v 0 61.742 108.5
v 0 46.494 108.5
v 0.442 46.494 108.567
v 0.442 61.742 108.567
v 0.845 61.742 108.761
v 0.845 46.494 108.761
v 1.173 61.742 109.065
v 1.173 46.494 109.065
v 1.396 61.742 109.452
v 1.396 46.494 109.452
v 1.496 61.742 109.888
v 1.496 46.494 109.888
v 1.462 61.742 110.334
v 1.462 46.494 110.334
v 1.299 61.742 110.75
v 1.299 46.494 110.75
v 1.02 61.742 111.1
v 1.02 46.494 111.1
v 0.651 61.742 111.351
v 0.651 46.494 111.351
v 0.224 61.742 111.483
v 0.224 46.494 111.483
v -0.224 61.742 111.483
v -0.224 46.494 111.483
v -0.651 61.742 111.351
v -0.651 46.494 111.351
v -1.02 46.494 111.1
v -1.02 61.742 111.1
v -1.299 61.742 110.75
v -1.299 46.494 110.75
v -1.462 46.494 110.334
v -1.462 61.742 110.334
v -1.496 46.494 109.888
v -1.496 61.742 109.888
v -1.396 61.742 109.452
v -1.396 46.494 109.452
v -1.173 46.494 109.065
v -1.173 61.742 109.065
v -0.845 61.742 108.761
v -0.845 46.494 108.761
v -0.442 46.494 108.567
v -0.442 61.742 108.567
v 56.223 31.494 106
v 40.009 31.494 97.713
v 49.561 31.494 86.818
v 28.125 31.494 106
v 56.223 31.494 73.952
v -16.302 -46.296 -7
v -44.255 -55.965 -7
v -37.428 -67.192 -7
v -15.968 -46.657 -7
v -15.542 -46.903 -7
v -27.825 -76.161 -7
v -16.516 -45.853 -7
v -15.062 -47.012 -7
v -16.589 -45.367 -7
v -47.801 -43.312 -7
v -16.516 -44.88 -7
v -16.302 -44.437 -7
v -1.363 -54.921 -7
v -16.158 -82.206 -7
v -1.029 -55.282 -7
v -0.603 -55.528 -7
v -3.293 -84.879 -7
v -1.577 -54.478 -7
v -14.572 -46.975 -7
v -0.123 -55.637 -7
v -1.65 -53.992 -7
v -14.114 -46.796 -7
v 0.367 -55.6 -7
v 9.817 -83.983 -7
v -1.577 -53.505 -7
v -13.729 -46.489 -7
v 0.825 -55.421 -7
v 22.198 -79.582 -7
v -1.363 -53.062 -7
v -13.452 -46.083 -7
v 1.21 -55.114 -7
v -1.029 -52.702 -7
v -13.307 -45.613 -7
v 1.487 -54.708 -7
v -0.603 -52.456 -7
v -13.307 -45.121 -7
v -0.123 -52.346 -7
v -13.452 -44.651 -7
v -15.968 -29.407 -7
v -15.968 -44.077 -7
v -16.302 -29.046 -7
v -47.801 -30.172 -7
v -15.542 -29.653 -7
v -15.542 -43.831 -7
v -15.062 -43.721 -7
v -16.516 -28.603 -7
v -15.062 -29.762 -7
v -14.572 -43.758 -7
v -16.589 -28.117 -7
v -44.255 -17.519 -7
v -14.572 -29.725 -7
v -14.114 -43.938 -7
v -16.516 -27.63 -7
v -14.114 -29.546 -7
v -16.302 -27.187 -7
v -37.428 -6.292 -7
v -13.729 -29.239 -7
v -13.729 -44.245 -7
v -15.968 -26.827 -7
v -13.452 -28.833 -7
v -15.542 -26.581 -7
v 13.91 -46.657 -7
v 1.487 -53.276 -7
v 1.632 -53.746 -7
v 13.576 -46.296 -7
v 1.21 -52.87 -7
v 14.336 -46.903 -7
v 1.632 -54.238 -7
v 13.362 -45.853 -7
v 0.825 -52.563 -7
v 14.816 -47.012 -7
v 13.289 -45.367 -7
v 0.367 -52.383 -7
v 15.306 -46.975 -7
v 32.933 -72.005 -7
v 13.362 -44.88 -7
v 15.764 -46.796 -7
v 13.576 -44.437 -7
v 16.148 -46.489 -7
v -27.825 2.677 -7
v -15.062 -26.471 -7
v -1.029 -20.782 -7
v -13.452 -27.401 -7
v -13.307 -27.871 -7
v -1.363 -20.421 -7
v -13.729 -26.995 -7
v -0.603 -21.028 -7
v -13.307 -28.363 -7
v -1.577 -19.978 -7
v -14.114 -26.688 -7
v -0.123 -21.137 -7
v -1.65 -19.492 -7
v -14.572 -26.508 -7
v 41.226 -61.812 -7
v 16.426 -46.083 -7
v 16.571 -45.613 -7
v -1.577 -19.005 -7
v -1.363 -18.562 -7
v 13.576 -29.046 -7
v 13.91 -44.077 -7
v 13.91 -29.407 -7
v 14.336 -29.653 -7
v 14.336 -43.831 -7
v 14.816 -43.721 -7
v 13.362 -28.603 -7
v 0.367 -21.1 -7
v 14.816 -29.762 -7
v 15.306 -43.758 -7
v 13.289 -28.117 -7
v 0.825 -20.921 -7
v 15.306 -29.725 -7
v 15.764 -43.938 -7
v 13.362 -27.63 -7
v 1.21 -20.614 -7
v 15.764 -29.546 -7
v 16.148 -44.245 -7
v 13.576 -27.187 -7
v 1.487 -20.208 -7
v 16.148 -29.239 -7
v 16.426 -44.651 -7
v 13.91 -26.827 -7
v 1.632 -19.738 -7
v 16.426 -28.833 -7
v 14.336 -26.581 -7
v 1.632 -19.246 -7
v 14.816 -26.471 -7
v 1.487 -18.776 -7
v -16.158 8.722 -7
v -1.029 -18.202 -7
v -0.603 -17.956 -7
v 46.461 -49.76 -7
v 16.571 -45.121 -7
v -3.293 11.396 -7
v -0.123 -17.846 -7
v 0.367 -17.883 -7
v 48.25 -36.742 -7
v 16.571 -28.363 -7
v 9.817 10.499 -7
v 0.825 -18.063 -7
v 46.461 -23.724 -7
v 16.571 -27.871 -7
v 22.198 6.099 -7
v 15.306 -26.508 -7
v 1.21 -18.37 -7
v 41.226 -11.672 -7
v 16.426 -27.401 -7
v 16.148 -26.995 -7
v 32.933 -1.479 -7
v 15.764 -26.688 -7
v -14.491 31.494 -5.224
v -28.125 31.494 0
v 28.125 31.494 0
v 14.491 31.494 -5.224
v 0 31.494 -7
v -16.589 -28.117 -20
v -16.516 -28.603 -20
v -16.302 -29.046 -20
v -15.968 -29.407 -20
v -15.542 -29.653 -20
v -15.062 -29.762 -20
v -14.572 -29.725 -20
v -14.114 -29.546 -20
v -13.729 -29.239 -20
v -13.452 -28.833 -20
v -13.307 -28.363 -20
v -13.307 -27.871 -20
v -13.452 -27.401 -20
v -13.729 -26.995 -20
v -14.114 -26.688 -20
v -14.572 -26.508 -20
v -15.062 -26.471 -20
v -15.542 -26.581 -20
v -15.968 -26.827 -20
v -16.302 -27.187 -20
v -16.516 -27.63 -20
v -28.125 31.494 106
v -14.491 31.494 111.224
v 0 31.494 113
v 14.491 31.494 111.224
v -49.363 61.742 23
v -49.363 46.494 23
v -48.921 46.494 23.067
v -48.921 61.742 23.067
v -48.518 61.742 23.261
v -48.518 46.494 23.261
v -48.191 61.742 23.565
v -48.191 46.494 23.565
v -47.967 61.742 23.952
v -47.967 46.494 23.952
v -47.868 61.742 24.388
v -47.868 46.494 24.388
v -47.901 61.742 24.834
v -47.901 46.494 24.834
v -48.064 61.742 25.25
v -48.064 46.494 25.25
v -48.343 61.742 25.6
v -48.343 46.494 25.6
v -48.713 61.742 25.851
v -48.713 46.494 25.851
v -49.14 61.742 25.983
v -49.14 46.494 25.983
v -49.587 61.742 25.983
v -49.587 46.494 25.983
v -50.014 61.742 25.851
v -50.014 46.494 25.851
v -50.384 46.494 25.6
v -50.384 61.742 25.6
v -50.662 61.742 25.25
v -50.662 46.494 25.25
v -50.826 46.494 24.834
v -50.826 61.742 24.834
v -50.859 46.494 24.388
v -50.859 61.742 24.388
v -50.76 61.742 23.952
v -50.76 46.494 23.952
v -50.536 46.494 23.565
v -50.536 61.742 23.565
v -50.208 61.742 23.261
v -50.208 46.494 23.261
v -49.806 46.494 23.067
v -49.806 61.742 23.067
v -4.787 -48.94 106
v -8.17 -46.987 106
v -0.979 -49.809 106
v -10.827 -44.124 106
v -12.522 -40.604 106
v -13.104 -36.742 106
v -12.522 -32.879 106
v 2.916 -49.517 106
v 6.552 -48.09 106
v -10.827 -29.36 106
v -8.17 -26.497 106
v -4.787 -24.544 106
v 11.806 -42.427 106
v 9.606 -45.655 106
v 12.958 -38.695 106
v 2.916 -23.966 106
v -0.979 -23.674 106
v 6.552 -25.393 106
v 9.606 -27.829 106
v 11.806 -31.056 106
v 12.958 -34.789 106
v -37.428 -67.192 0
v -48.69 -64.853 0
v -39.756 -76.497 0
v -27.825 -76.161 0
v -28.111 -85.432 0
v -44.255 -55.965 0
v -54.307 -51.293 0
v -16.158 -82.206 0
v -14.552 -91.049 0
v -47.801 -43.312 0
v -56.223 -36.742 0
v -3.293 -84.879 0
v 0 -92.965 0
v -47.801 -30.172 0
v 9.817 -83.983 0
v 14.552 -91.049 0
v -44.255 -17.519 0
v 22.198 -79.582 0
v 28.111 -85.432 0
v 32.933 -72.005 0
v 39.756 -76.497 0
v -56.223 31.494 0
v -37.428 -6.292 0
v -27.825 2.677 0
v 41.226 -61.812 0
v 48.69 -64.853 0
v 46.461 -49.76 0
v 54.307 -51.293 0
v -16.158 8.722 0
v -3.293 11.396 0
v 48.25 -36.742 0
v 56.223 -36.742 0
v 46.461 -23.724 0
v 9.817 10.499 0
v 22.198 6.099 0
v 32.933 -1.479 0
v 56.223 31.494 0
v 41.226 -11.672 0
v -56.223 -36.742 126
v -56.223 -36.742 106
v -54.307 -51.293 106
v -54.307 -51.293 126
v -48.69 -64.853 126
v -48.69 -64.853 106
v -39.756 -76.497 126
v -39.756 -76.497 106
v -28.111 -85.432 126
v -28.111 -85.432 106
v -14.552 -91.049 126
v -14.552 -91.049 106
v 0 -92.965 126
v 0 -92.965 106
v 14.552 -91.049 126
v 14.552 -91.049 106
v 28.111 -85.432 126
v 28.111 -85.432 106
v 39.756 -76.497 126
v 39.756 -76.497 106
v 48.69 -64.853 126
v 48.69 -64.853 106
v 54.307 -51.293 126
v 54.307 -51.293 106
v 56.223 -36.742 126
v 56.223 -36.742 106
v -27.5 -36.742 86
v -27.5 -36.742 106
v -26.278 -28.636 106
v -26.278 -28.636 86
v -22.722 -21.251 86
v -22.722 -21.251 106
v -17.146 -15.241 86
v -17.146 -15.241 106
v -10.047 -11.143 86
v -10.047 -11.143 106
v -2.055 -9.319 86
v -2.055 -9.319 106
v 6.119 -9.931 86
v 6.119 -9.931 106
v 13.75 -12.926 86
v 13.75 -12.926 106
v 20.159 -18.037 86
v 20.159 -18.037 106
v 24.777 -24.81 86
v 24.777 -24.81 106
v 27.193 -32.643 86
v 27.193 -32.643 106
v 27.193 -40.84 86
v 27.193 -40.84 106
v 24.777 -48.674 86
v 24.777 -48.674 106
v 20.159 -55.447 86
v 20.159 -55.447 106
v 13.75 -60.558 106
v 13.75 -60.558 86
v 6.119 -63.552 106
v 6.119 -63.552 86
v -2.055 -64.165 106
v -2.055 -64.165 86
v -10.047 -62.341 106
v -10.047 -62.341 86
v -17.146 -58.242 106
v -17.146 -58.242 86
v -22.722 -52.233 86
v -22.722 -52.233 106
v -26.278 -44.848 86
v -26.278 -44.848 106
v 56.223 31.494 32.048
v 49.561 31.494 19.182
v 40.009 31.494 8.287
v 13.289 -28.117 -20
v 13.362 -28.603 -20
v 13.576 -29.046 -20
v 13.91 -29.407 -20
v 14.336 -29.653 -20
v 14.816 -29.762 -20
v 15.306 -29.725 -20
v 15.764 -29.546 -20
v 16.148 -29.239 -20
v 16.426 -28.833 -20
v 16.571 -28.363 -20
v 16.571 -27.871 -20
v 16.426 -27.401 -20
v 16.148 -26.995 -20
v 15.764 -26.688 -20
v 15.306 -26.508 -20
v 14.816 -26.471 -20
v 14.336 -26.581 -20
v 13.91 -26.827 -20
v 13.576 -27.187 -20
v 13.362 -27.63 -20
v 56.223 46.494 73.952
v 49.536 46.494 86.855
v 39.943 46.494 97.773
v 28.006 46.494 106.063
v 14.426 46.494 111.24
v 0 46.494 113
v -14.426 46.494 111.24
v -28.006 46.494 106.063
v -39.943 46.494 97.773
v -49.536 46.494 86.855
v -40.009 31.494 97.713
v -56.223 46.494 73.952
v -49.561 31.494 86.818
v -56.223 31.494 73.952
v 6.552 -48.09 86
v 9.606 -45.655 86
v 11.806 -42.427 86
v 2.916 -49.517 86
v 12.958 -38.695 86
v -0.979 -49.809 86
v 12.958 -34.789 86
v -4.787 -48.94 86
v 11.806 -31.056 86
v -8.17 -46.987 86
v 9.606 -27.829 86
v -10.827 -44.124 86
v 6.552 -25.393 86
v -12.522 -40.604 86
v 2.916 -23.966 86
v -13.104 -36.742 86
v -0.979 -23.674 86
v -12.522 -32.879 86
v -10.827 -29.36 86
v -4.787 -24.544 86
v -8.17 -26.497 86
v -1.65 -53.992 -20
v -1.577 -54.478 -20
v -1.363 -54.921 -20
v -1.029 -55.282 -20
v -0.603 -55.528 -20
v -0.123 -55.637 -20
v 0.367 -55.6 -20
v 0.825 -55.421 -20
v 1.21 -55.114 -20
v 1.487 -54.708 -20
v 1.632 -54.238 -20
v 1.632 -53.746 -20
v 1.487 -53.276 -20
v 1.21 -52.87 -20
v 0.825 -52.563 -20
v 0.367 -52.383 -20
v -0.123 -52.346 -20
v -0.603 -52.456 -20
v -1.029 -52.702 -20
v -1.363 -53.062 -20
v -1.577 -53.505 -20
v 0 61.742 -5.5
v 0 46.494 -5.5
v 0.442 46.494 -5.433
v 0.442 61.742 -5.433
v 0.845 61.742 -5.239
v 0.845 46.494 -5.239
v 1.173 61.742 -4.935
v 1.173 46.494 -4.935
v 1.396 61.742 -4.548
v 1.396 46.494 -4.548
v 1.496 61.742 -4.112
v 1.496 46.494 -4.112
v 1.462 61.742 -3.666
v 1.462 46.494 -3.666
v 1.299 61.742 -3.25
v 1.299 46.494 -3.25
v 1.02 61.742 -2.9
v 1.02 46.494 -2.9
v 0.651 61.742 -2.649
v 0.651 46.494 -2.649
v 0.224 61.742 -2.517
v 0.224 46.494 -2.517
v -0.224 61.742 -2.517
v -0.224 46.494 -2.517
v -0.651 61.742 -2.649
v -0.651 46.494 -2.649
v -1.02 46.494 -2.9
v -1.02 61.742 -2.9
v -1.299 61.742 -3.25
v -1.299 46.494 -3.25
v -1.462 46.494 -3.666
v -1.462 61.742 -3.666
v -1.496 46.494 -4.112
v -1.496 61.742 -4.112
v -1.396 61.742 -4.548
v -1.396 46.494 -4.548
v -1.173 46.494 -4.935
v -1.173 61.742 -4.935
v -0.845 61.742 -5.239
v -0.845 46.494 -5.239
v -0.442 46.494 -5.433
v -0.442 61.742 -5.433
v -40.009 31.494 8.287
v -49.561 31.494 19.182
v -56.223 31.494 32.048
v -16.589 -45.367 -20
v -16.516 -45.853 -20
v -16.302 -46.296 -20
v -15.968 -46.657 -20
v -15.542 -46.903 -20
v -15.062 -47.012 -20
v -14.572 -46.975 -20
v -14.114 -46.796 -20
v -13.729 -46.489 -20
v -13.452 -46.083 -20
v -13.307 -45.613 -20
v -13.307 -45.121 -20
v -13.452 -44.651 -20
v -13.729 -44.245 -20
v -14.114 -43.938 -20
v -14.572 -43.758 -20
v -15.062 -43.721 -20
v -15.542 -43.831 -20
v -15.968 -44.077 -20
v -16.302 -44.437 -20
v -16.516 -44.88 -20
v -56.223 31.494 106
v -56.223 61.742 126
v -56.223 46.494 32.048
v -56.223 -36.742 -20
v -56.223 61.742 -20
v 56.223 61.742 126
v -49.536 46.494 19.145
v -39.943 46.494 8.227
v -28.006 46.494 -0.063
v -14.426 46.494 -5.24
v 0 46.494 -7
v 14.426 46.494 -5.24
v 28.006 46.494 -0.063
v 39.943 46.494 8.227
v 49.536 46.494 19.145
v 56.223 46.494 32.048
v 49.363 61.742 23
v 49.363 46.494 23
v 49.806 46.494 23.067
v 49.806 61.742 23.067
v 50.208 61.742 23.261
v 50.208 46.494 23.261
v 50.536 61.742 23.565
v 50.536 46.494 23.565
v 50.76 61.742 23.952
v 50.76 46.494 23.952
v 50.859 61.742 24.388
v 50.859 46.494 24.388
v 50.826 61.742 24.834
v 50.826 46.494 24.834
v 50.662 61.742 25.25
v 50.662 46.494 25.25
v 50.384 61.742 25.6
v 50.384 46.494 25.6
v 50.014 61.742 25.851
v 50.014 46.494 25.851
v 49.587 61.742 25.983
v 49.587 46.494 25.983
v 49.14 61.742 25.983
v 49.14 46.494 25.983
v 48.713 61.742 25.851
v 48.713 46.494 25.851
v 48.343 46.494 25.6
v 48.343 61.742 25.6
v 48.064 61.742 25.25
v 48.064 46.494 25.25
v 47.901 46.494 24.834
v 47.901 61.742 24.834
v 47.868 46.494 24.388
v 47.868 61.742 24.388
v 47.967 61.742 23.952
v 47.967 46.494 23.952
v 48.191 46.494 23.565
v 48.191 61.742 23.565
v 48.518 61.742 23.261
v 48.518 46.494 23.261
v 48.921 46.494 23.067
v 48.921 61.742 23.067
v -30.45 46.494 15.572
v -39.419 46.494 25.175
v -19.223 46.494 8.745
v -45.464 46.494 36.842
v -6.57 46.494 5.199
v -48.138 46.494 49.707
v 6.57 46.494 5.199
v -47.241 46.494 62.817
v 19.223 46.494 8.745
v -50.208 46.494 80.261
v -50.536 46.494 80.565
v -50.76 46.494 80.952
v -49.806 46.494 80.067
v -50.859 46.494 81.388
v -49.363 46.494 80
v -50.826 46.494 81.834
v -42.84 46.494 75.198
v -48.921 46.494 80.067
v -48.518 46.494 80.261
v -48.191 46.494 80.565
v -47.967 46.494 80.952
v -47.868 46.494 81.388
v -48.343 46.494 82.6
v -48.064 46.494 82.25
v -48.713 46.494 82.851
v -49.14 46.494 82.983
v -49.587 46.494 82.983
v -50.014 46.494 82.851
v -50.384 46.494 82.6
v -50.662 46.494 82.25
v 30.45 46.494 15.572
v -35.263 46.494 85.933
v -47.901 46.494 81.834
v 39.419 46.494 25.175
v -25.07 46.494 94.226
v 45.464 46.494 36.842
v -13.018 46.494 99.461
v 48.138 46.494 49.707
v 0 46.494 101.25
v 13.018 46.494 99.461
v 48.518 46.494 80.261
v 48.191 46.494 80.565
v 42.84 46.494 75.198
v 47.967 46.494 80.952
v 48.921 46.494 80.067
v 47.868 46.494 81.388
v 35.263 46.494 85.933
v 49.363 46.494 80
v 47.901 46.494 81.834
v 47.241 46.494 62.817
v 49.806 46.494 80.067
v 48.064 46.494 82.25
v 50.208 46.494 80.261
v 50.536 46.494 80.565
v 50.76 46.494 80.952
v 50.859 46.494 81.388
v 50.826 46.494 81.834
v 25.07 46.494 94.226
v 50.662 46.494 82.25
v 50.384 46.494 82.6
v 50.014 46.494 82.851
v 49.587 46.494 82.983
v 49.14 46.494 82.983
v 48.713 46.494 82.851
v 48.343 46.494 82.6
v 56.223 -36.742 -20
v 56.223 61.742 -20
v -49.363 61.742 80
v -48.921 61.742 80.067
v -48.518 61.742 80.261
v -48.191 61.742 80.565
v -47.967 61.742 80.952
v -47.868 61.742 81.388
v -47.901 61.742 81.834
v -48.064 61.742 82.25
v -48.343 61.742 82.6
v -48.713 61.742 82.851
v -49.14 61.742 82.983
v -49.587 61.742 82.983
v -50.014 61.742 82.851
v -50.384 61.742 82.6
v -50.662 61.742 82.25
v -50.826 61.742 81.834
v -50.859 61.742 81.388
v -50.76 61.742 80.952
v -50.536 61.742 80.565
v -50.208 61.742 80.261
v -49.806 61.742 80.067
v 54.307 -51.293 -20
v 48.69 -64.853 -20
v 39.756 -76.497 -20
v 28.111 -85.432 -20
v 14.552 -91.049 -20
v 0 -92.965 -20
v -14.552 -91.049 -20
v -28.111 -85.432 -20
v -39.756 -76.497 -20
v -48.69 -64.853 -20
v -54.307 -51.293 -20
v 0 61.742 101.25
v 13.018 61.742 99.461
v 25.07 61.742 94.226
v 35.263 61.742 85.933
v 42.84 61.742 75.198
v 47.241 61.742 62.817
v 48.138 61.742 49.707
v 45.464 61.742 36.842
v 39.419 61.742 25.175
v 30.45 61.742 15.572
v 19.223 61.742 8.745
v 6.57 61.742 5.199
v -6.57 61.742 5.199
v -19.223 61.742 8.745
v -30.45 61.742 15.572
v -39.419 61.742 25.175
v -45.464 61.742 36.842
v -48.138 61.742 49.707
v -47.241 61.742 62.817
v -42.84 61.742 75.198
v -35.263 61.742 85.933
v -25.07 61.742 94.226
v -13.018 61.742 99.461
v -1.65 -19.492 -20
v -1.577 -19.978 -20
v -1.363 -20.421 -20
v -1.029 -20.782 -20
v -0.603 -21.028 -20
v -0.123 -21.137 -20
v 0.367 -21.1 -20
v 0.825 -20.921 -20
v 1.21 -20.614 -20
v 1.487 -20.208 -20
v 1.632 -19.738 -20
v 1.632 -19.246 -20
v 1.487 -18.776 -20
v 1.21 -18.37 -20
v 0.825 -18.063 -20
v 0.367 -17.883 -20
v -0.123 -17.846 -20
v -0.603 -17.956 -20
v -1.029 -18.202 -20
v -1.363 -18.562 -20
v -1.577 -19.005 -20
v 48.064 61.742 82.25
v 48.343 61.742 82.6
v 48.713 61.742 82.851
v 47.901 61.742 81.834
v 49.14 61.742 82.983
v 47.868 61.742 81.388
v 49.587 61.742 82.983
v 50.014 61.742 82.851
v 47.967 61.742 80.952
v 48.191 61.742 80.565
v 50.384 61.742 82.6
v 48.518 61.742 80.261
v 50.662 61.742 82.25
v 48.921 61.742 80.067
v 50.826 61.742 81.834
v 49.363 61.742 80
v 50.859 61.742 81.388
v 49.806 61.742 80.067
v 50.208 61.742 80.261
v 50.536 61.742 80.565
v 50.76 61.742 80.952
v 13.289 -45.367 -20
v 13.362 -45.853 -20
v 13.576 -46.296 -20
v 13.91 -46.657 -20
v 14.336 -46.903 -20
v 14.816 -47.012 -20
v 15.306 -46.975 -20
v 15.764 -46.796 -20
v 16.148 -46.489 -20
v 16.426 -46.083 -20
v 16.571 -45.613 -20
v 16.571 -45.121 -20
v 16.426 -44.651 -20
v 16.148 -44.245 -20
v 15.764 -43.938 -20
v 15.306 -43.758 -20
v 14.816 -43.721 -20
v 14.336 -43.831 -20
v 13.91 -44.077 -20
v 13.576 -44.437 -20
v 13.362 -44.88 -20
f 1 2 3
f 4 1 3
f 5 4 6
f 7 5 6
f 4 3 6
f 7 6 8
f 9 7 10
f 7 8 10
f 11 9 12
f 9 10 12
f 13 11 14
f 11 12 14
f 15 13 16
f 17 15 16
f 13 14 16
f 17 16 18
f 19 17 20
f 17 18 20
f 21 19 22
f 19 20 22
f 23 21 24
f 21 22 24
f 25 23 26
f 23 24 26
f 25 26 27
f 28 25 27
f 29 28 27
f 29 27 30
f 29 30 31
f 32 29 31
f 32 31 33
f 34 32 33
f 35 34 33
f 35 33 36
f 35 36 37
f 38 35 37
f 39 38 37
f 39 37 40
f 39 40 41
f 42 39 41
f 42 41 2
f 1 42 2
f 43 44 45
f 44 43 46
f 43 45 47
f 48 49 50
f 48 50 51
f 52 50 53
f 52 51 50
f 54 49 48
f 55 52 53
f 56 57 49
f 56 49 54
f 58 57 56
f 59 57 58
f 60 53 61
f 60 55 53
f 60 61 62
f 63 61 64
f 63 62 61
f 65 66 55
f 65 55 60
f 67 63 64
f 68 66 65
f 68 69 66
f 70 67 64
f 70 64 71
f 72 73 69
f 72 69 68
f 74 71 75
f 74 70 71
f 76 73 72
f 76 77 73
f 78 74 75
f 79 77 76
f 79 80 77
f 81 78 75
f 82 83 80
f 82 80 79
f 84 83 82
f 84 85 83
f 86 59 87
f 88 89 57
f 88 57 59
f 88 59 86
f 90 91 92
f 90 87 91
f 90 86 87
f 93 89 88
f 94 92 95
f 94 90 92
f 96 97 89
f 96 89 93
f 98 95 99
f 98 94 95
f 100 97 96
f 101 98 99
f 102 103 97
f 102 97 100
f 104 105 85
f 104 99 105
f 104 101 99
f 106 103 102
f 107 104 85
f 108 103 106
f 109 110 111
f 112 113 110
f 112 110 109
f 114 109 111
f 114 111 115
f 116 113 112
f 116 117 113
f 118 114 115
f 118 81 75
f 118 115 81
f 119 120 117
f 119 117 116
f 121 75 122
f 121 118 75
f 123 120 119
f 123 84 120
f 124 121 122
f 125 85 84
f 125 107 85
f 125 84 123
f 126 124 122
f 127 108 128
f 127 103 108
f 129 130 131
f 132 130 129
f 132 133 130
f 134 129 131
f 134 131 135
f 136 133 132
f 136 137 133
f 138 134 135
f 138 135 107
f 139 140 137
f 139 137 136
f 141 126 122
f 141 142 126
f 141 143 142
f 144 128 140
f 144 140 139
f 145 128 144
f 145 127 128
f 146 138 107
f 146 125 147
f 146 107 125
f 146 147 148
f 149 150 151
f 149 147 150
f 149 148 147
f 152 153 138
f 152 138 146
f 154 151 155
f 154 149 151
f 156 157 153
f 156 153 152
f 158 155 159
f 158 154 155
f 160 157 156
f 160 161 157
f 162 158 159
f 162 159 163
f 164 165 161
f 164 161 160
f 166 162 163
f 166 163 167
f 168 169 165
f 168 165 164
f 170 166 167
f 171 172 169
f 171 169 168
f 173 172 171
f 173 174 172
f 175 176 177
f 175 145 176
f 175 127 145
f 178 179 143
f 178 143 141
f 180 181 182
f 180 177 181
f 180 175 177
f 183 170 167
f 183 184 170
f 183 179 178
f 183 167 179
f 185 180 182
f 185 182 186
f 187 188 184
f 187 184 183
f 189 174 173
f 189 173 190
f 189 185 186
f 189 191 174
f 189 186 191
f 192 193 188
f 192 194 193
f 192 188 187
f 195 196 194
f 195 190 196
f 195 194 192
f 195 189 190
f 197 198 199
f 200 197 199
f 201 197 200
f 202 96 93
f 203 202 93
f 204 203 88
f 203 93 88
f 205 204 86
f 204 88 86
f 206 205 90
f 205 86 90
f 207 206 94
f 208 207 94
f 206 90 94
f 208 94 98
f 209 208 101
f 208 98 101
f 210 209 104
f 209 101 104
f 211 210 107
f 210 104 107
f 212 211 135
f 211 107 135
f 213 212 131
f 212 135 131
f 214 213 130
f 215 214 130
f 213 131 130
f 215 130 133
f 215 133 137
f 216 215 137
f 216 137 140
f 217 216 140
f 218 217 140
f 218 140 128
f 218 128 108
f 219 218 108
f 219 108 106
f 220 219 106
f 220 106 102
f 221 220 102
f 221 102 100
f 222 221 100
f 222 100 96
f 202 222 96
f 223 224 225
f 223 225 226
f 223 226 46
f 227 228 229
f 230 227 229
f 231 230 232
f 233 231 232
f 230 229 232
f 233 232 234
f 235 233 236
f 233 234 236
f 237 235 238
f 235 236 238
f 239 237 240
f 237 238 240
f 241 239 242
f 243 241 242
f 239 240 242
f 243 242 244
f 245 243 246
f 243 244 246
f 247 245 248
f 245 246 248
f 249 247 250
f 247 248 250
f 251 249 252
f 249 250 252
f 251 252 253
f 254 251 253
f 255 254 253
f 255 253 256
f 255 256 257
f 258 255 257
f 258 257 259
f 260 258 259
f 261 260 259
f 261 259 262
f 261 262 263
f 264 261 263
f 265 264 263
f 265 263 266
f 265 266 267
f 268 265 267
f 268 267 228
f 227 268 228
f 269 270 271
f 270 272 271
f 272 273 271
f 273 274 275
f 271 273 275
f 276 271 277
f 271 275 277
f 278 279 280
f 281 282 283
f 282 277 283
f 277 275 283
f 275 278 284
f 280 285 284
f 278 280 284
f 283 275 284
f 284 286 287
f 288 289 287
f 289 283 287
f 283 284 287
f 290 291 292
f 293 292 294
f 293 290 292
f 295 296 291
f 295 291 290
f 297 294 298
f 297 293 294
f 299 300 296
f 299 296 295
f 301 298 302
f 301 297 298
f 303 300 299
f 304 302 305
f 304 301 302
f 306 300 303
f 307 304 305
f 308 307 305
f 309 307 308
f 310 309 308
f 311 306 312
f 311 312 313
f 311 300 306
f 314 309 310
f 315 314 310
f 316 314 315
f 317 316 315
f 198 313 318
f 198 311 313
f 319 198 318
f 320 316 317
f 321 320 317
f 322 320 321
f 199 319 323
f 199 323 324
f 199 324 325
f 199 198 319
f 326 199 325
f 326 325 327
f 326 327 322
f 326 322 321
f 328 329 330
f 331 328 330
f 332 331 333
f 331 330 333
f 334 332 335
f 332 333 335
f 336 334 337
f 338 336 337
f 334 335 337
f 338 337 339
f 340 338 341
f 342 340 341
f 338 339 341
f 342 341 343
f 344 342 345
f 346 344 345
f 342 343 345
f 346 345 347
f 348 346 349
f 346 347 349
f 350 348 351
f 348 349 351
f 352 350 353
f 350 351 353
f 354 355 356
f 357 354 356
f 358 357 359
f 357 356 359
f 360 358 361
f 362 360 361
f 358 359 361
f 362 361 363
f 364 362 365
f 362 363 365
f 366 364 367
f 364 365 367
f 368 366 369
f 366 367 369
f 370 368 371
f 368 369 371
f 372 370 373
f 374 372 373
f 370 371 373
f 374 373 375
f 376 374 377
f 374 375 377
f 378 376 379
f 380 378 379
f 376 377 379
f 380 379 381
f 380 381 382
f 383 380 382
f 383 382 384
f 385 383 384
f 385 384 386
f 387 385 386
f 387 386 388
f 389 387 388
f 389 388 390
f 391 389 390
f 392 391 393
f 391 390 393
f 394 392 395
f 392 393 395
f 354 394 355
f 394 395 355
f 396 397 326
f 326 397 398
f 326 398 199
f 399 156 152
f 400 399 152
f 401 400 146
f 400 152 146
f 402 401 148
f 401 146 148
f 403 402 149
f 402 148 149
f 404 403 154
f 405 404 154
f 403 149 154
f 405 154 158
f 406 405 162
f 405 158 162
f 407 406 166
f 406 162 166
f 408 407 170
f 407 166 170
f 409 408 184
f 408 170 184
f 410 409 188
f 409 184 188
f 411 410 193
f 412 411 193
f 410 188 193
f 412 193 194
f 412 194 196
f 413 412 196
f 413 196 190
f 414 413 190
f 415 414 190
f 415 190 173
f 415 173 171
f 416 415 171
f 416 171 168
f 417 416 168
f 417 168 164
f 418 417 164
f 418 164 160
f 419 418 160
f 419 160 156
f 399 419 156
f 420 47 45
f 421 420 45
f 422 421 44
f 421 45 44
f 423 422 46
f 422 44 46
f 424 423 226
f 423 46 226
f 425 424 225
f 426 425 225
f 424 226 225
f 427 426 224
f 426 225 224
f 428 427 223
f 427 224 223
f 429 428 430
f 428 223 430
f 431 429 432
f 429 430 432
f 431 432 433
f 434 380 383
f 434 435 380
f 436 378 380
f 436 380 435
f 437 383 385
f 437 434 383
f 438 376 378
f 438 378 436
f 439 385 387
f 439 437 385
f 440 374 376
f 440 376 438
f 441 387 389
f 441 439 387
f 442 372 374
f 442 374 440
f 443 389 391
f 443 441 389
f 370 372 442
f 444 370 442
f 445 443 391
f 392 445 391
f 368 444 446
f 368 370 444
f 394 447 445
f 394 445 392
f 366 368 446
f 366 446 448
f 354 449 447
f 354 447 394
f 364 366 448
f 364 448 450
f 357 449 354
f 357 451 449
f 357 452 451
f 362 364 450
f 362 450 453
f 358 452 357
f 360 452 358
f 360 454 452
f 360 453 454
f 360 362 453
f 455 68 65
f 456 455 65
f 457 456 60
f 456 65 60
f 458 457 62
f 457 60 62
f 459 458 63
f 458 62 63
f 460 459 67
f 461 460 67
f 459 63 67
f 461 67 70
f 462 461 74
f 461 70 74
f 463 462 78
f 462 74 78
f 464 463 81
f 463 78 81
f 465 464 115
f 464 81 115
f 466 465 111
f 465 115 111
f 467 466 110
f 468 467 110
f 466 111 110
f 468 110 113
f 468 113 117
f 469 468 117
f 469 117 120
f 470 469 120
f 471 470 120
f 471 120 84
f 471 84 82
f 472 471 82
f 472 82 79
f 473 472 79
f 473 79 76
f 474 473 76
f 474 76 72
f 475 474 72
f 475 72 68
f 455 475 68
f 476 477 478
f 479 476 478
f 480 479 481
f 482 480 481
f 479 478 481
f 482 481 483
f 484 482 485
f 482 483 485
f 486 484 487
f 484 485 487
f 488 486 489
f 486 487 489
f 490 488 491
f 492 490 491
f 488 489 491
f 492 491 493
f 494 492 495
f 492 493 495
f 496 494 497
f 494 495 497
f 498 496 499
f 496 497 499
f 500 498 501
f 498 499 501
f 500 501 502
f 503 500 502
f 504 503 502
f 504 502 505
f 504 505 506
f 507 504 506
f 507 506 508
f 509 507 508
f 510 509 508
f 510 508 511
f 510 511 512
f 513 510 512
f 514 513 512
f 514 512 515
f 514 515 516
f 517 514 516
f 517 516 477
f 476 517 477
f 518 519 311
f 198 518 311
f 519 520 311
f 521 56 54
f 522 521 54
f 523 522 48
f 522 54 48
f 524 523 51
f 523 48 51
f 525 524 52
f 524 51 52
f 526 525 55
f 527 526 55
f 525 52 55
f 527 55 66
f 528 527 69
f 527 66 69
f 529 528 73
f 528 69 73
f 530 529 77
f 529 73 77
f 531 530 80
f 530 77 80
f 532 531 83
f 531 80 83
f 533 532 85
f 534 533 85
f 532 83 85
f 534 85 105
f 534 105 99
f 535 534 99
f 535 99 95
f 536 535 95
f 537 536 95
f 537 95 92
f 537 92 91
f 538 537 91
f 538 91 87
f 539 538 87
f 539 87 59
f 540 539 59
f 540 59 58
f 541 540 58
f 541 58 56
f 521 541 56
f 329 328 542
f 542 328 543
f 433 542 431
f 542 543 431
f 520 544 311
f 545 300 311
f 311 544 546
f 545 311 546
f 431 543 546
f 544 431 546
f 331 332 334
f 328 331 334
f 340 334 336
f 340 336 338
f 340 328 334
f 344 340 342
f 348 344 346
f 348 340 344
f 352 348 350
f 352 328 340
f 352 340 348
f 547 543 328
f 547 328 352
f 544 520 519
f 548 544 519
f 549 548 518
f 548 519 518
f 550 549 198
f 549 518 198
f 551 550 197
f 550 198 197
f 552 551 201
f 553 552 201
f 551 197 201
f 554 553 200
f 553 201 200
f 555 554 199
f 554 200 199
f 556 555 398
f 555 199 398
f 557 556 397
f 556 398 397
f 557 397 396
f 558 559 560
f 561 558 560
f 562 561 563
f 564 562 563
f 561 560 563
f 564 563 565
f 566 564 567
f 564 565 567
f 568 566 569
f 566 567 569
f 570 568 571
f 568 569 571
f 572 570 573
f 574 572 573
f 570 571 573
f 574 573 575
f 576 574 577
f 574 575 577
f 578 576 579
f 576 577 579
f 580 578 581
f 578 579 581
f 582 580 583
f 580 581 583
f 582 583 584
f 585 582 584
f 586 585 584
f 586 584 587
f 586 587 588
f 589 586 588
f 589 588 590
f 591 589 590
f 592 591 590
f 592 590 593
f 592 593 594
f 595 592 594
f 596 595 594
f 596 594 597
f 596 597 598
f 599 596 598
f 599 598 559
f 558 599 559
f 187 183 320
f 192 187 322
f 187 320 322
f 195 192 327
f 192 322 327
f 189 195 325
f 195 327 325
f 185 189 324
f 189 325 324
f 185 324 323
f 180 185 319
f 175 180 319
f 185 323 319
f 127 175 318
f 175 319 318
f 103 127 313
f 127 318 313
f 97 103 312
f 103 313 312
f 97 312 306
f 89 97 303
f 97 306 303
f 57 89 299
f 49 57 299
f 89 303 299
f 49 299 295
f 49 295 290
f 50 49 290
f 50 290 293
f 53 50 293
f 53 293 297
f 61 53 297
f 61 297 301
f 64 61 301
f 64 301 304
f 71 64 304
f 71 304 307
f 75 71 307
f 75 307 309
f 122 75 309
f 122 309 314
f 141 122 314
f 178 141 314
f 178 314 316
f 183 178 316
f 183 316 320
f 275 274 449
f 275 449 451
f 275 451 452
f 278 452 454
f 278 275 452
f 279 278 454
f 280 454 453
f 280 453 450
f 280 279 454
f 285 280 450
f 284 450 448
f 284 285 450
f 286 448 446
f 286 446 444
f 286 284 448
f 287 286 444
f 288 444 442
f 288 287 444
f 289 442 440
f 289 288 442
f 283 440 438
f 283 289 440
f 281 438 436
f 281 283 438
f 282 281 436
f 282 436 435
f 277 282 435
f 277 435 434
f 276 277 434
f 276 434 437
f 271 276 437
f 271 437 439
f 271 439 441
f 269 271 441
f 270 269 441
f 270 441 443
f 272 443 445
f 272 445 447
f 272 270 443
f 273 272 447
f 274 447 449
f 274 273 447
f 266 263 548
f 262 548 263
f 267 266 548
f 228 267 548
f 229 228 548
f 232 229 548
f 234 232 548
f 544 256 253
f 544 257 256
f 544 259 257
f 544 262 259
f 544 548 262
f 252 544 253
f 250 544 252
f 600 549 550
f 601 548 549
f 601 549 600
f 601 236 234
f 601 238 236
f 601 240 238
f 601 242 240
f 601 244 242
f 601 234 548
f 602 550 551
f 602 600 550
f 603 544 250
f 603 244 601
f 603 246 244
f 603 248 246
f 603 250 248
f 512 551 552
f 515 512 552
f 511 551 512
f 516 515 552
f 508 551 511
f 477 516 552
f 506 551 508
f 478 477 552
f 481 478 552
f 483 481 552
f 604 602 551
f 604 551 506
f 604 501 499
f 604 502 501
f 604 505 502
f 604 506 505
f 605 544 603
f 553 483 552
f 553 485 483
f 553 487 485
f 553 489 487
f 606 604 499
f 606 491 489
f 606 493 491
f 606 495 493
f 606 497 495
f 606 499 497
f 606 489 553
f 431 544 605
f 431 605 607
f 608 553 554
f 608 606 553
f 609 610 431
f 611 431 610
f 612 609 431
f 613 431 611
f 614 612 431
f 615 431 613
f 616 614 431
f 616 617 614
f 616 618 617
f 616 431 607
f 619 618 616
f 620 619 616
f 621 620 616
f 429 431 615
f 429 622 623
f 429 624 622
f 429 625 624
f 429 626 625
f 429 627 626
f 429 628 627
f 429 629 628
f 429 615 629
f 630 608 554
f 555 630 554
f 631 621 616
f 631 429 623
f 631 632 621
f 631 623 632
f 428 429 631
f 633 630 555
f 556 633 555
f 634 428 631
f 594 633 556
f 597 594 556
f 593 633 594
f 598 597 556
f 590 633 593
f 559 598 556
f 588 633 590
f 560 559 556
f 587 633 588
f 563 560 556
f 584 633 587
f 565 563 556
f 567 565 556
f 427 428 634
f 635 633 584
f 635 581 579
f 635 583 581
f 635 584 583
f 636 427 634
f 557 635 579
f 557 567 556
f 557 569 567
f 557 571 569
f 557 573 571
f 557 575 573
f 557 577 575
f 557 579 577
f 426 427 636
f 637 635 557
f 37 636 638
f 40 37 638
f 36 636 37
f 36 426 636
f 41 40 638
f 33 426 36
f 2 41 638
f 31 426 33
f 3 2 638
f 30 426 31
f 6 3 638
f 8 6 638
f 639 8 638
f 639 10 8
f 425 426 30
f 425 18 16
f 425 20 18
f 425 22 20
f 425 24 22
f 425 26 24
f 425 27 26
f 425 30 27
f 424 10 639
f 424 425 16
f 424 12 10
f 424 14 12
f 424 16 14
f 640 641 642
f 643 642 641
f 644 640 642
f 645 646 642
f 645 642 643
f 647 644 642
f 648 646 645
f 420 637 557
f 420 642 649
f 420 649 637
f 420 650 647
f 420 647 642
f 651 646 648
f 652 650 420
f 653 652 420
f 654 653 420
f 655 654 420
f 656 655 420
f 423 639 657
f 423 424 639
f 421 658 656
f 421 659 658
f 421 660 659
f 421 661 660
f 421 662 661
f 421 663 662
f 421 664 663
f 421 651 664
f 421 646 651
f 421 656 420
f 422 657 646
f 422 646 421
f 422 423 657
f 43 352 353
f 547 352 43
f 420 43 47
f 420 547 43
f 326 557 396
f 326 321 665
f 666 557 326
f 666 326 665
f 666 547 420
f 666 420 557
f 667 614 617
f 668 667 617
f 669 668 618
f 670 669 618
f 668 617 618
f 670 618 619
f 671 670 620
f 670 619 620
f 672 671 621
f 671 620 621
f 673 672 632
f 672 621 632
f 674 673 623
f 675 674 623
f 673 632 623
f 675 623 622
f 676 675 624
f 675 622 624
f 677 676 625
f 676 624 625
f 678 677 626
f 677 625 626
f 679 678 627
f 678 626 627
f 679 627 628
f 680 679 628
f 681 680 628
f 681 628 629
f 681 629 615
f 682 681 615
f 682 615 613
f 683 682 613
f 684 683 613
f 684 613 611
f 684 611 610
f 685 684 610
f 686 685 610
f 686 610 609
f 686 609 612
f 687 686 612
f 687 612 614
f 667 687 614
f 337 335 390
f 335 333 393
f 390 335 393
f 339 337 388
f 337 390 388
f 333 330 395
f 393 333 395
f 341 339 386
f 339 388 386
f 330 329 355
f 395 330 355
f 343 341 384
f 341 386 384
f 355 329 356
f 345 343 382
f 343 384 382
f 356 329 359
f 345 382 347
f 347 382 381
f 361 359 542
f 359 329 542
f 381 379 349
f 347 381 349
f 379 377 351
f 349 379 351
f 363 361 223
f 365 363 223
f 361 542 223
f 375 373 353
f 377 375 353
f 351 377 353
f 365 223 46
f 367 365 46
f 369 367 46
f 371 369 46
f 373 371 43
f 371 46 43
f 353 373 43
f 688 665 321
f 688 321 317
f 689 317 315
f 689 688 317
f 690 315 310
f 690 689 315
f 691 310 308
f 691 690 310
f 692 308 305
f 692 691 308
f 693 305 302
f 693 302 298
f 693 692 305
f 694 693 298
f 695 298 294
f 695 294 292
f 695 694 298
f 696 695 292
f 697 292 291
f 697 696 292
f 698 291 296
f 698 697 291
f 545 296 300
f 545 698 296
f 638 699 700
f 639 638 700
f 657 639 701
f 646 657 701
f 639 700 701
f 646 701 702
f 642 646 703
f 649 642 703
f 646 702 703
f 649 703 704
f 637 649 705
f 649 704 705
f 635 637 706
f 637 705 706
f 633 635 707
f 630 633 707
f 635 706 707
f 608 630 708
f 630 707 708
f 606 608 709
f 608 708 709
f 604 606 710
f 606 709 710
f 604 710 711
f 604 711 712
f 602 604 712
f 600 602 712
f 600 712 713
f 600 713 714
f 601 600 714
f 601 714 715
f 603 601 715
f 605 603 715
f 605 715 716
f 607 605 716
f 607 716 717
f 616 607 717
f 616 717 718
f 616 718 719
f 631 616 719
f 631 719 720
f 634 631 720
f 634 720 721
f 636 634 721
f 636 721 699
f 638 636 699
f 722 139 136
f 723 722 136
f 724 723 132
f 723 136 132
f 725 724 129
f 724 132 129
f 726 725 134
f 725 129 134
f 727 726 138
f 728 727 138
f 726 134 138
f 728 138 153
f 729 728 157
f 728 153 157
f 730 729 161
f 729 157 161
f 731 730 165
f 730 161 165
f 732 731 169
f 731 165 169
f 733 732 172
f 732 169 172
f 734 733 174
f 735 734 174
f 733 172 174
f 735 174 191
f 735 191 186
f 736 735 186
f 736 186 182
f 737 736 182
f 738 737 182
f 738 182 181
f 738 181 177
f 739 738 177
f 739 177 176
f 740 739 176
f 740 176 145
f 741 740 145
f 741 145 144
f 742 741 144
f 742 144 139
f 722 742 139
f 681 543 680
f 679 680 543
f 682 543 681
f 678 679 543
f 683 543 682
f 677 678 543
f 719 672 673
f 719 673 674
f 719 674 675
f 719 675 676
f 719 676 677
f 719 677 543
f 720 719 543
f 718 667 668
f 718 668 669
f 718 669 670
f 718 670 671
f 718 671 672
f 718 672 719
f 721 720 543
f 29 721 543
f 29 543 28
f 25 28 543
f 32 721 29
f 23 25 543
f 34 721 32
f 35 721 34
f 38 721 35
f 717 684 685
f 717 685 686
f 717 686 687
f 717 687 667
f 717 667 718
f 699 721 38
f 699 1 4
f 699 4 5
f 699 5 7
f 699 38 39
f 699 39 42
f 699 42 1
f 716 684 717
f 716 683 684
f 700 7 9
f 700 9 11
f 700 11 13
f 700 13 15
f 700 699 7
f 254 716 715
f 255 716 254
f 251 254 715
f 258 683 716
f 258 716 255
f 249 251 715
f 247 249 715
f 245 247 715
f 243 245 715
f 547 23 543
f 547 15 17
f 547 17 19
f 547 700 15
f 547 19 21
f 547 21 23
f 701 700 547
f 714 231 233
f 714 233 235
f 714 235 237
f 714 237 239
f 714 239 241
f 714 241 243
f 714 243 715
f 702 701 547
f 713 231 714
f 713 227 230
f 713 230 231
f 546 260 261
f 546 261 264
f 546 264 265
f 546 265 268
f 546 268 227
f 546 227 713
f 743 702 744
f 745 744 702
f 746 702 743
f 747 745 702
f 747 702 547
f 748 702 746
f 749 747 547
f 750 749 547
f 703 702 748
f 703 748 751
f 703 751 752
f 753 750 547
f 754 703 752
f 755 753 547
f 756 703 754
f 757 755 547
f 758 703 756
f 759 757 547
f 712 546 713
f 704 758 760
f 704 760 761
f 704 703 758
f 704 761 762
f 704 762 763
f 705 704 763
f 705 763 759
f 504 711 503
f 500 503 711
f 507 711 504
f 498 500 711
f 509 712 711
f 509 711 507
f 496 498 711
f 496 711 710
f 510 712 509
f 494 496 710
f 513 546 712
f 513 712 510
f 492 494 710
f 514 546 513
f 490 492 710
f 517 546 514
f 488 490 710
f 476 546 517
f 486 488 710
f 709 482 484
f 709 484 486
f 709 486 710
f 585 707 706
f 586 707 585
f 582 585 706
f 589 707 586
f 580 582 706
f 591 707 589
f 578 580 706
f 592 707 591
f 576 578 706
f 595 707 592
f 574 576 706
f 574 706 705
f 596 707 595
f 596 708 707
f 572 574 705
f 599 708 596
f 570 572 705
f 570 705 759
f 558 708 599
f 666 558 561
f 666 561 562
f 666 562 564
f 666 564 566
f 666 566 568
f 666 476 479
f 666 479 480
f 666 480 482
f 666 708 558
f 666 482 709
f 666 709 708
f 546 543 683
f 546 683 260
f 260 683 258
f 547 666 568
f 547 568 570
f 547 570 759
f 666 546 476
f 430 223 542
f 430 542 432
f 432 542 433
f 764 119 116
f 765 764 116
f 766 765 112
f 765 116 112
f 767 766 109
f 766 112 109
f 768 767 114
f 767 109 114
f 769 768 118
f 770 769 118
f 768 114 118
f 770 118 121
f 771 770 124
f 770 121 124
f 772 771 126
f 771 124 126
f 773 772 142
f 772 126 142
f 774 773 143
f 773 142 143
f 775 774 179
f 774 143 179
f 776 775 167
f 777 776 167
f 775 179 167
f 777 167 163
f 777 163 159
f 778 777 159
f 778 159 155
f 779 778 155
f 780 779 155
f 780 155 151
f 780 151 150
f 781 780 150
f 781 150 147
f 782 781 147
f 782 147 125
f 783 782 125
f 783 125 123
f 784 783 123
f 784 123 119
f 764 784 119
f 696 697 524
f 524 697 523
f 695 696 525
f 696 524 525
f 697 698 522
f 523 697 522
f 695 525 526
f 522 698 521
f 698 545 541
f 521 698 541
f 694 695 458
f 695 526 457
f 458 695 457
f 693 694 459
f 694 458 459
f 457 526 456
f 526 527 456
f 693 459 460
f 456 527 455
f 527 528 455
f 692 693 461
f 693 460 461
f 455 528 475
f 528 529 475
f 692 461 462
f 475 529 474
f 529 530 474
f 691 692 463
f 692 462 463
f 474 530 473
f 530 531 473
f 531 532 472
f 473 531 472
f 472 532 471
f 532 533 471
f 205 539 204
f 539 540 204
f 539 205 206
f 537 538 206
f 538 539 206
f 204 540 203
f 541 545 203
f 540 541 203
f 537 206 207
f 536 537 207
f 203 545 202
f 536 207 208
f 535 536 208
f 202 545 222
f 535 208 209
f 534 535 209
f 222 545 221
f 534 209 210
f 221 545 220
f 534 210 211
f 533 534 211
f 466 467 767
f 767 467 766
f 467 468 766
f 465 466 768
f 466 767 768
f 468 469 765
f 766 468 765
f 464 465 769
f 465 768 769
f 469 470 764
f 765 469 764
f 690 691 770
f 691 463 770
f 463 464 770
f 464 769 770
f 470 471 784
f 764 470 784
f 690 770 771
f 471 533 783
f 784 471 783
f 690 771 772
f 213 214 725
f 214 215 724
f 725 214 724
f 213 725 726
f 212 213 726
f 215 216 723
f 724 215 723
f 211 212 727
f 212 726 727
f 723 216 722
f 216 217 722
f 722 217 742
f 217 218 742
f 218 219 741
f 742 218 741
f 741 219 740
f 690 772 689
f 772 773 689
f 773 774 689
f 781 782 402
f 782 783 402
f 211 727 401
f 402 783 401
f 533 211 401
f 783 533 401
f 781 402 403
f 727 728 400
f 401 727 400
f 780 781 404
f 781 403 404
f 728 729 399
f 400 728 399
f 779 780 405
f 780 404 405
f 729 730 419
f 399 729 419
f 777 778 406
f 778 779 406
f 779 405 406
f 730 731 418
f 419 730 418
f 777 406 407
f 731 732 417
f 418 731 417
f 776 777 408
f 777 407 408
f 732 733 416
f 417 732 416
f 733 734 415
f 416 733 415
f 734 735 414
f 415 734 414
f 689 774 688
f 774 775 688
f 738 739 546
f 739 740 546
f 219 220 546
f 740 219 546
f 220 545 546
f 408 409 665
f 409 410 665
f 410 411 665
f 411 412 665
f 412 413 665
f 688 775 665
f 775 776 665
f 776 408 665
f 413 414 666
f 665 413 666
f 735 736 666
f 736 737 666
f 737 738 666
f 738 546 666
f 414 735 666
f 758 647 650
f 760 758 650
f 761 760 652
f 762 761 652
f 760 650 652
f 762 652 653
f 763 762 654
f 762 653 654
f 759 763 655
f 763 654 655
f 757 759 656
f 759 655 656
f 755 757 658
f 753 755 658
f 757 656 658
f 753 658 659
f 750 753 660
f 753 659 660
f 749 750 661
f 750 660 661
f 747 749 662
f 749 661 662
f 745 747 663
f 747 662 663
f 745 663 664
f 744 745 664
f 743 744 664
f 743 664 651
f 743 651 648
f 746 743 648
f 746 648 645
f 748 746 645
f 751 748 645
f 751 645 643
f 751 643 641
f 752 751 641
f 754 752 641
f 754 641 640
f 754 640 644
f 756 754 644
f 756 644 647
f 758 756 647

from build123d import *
from build123d.topology import SkipClean

# Parameters (mm, degrees)
SKETCH_1_R                      = 48.25
EXTRUDE_1_DEPTH                 = 20
EXTRUDE_2_DEPTH                 = 66
SKETCH_3_R                      = 48.25
EXTRUDE_3_DEPTH                 = 20
SKETCH_4_R                      = 48.25
CUT_EXTRUDE_1_DEPTH             = 20
SKETCH_5_R                      = 48.25
EXTRUDE_4_DEPTH                 = 20
CUT_EXTRUDE_2_DEPTH             = 20
EXTRUDE_START                   = 20
SKETCH_7_R                      = 48.25
EXTRUDE_5_DEPTH                 = 20
CUT_EXTRUDE_START               = -20
CUT_EXTRUDE_3_DEPTH             = 20
SKETCH_9_R                      = 48.25
EXTRUDE_6_DEPTH                 = 20
EXTRUDE_START_2                 = -20
SKETCH_10_R                     = 48.25
EXTRUDE_7_DEPTH                 = 20
SKETCH_14_R                     = 1.65
EXTRUDE_11_DEPTH                = 10
EXTRUDE_START_3                 = 10
SKETCH_15_R                     = 1.65
EXTRUDE_12_DEPTH                = 10
SKETCH_16_R                     = 27.5
SKETCH_16_R_2                   = 13.104074627
EXTRUDE_13_DEPTH                = 20
CUT_EXTRUDE_4_REACH             = 168.371
SKETCH_17_R                     = 1.65
CUT_EXTRUDE_4_DIRECTION_2_REACH = 168.371
SKETCH_18_R                     = 48.25
CUT_EXTRUDE_5_DEPTH             = 7
CUT_EXTRUDE_6_DEPTH             = 193.775751689
EXTRUDE_START_4                 = 25
SKETCH_20_W                     = 112.445782612
SKETCH_20_H                     = 146
SKETCH_20_R                     = 48.25
EXTRUDE_14_DEPTH                = 25
SKETCH_21_R                     = 60
CUT_EXTRUDE_7_DEPTH             = 15
SKETCH_22_R                     = 1.5
CUT_EXTRUDE_8_DEPTH             = 197.177673484


with BuildPart() as part:
    # 草图1 → 凸台-拉伸1 (new body)
    with BuildSketch(Plane.XY):
        with BuildLine():
            Line((-56.222891306, -36.741813889), (-56.222891306, 36.741813889))
            Line((-56.222891306, 36.741813889), (56.222891306, 36.741813889))
            Line((56.222891306, 36.741813889), (56.222891306, -36.741813889))
            ThreePointArc((56.222891306, -36.741813889), (0, -92.964705195), (-56.222891306, -36.741813889))
        make_face()
        with Locations((0, -36.741813889)):
            Circle(SKETCH_1_R, mode=Mode.SUBTRACT)
    extrude(amount=EXTRUDE_1_DEPTH)

    # 草图2 → 凸台-拉伸2 (add)
    with BuildSketch(Plane.XY.offset(20)):
        Polygon((-43.974846567, 18.741813889), (-56.222891306, 18.741813889), (-56.222891306, 6.493769151), align=None)
        Polygon((56.222891306, 18.741813889), (43.974846567, 18.741813889), (56.222891306, 6.493769151), align=None)
        Polygon((-56.222891306, 36.741813889), (-56.222891306, 18.741813889), (-43.974846567, 18.741813889), (43.974846567, 18.741813889), (56.222891306, 18.741813889), (56.222891306, 36.741813889), align=None)
    extrude(amount=EXTRUDE_2_DEPTH)

    # 草图3 → 凸台-拉伸3 (add)
    with BuildSketch(Plane.XY.offset(86)):
        with BuildLine():
            Line((-56.222891306, 36.741813889), (-56.222891306, -36.741813889))
            ThreePointArc((-56.222891306, -36.741813889), (0, -92.964705195), (56.222891306, -36.741813889))
            Line((56.222891306, -36.741813889), (56.222891306, 36.741813889))
            Line((56.222891306, 36.741813889), (-56.222891306, 36.741813889))
        make_face()
        with Locations((0, -36.741813889)):
            Circle(SKETCH_3_R, mode=Mode.SUBTRACT)
    extrude(amount=EXTRUDE_3_DEPTH)

    # 草图4 → 切除-拉伸1 (cut)
    with BuildSketch(Plane(origin=(0, 36.741813889, 0), x_dir=(1, 0, 0), z_dir=(0, 1, 0))):
        with Locations(Location((0, -53, 0), (0, 0, 270))):
            Circle(SKETCH_4_R)
    extrude(amount=-CUT_EXTRUDE_1_DEPTH, mode=Mode.SUBTRACT)

    # 草图5 → 凸台-拉伸4 (add)
    with BuildSketch(Plane.XY.offset(106)):
        with BuildLine():
            Line((56.222891306, -36.741813889), (56.222891306, 36.741813889))
            Line((56.222891306, 36.741813889), (-56.222891306, 36.741813889))
            Line((-56.222891306, 36.741813889), (-56.222891306, -36.741813889))
            ThreePointArc((-56.222891306, -36.741813889), (0, -92.964705195), (56.222891306, -36.741813889))
        make_face()
        with Locations((0, -36.741813889)):
            Circle(SKETCH_5_R, mode=Mode.SUBTRACT)
    extrude(amount=EXTRUDE_4_DEPTH)

    # 草图6 → 切除-拉伸2 (cut)
    with BuildSketch(Plane(origin=(0, 0, 86), x_dir=(-1, 0, 0), z_dir=(0, 0, -1))):
        with BuildLine():
            Line((35.200319601, 16.741813889), (-35.200319601, 16.741813889))
            Line((-35.200319601, 16.741813889), (-35.200319601, 18.741813889))
            Line((-35.200319601, 18.741813889), (-43.974846567, 18.741813889))
            Line((-43.974846567, 18.741813889), (-56.222891306, 6.493769151))
            Line((-56.222891306, 6.493769151), (-56.222891306, -36.741813889))
            ThreePointArc((-56.222891306, -36.741813889), (0, -92.964705195), (56.222891306, -36.741813889))
            Line((56.222891306, -36.741813889), (56.222891306, 6.493769151))
            Line((56.222891306, 6.493769151), (43.974846567, 18.741813889))
            Line((43.974846567, 18.741813889), (35.200319601, 18.741813889))
            Line((35.200319601, 18.741813889), (35.200319601, 16.741813889))
        make_face()
    extrude(amount=-CUT_EXTRUDE_2_DEPTH, mode=Mode.SUBTRACT)

    # 草图7 → 凸台-拉伸5 (add)
    with SkipClean():  # the faces are left unmerged after this step: merging them gives an invalid solid
        with BuildSketch(Plane(origin=(0, 0, 0), x_dir=(-1, 0, 0), z_dir=(0, 0, -1)).offset(EXTRUDE_START)):
            with BuildLine():
                Line((56.222891306, -36.741813889), (56.222891306, 36.741813889))
                Line((56.222891306, 36.741813889), (-56.222891306, 36.741813889))
                Line((-56.222891306, 36.741813889), (-56.222891306, -36.741813889))
                ThreePointArc((-56.222891306, -36.741813889), (0, -92.964705195), (56.222891306, -36.741813889))
            make_face()
            with Locations((0, -36.741813889)):
                Circle(SKETCH_7_R, mode=Mode.SUBTRACT)
        extrude(amount=-EXTRUDE_5_DEPTH)

    # 草图8 → 切除-拉伸3 (cut)
    with BuildSketch(Plane.XY.offset(20).offset(CUT_EXTRUDE_START)):
        with BuildLine():
            Line((35.200319601, 18.741813889), (35.200319601, 16.741813889))
            Line((35.200319601, 16.741813889), (-35.200319601, 16.741813889))
            Line((-35.200319601, 16.741813889), (-35.200319601, 18.741813889))
            Line((-35.200319601, 18.741813889), (-43.974846567, 18.741813889))
            Line((-43.974846567, 18.741813889), (-56.222891306, 6.493769151))
            Line((-56.222891306, 6.493769151), (-56.222891306, -36.741813889))
            ThreePointArc((-56.222891306, -36.741813889), (0, -92.964705195), (56.222891306, -36.741813889))
            Line((56.222891306, -36.741813889), (56.222891306, 6.493769151))
            Line((56.222891306, 6.493769151), (43.974846567, 18.741813889))
            Line((43.974846567, 18.741813889), (35.200319601, 18.741813889))
        make_face()
    extrude(amount=CUT_EXTRUDE_3_DEPTH, mode=Mode.SUBTRACT)

    # 草图9 → 凸台-拉伸6 (add)
    with BuildSketch(Plane(origin=(0, 0, -20), x_dir=(-1, 0, 0), z_dir=(0, 0, -1))):
        with Locations((0, -36.741813889)):
            Circle(SKETCH_9_R)
    extrude(amount=-EXTRUDE_6_DEPTH)

    # 草图10 → 凸台-拉伸7 (add)
    with BuildSketch(Plane.XY.offset(126).offset(EXTRUDE_START_2)):
        with Locations((0, -36.741813889)):
            Circle(SKETCH_10_R)
    extrude(amount=EXTRUDE_7_DEPTH)

    # 草图14 → 凸台-拉伸11 (add)
    with BuildSketch(Plane.XY):
        with Locations((-14.938938215, -45.366813889)):
            Circle(SKETCH_14_R)
        with Locations((0, -53.991813889)):
            Circle(SKETCH_14_R)
        with Locations((14.938938215, -45.366813889)):
            Circle(SKETCH_14_R)
        with Locations((14.938938215, -28.116813889)):
            Circle(SKETCH_14_R)
        with Locations((0, -19.491813889)):
            Circle(SKETCH_14_R)
        with Locations((-14.938938215, -28.116813889)):
            Circle(SKETCH_14_R)
    extrude(amount=EXTRUDE_11_DEPTH)

    # 草图15 → 凸台-拉伸12 (add)
    with BuildSketch(Plane(origin=(0, 0, 106), x_dir=(-1, 0, 0), z_dir=(0, 0, -1)).offset(EXTRUDE_START_3)):
        with Locations(Location((14.938938215, -28.116813889, 0), (0, 0, 180))):
            Circle(SKETCH_15_R)
        with Locations(Location((14.938938215, -45.366813889, 0), (0, 0, 180))):
            Circle(SKETCH_15_R)
        with Locations(Location((0, -53.991813889, 0), (0, 0, 180))):
            Circle(SKETCH_15_R)
        with Locations(Location((-14.938938215, -45.366813889, 0), (0, 0, 180))):
            Circle(SKETCH_15_R)
        with Locations(Location((-14.938938215, -28.116813889, 0), (0, 0, 180))):
            Circle(SKETCH_15_R)
        with Locations(Location((0, -19.491813889, 0), (0, 0, 180))):
            Circle(SKETCH_15_R)
    extrude(amount=-EXTRUDE_12_DEPTH)

    # 草图16 → 凸台-拉伸13 (add)
    with BuildSketch(Plane(origin=(0, 0, 106), x_dir=(-1, 0, 0), z_dir=(0, 0, -1))):
        with Locations((0, -36.741813889)):
            Circle(SKETCH_16_R)
        with Locations((0, -36.741813889)):
            Circle(SKETCH_16_R_2, mode=Mode.SUBTRACT)
    extrude(amount=EXTRUDE_13_DEPTH)

    # 草图17 → 切除-拉伸4 (cut, up to next)
    with BuildSketch(Plane.XY, mode=Mode.PRIVATE) as cut_extrude_4_sk1:
        with Locations(Location((-14.938938215, -45.366813889, 0), (0, 0, 180))):
            Circle(SKETCH_17_R)
    cut_extrude_4_tool1 = extrude(cut_extrude_4_sk1.sketch, amount=-CUT_EXTRUDE_4_REACH, mode=Mode.PRIVATE) & part.part
    # 草图17 → 切除-拉伸4 (cut, up to next)
    with BuildSketch(Plane.XY, mode=Mode.PRIVATE) as cut_extrude_4_sk2:
        with Locations(Location((0, -53.991813889, 0), (0, 0, 180))):
            Circle(SKETCH_17_R)
    cut_extrude_4_tool2 = extrude(cut_extrude_4_sk2.sketch, amount=-CUT_EXTRUDE_4_REACH, mode=Mode.PRIVATE) & part.part
    # 草图17 → 切除-拉伸4 (cut, up to next)
    with BuildSketch(Plane.XY, mode=Mode.PRIVATE) as cut_extrude_4_sk3:
        with Locations(Location((14.938938215, -45.366813889, 0), (0, 0, 180))):
            Circle(SKETCH_17_R)
    cut_extrude_4_tool3 = extrude(cut_extrude_4_sk3.sketch, amount=-CUT_EXTRUDE_4_REACH, mode=Mode.PRIVATE) & part.part
    # 草图17 → 切除-拉伸4 (cut, up to next)
    with BuildSketch(Plane.XY, mode=Mode.PRIVATE) as cut_extrude_4_sk4:
        with Locations(Location((14.938938215, -28.116813889, 0), (0, 0, 180))):
            Circle(SKETCH_17_R)
    cut_extrude_4_tool4 = extrude(cut_extrude_4_sk4.sketch, amount=-CUT_EXTRUDE_4_REACH, mode=Mode.PRIVATE) & part.part
    # 草图17 → 切除-拉伸4 (cut, up to next)
    with BuildSketch(Plane.XY, mode=Mode.PRIVATE) as cut_extrude_4_sk5:
        with Locations(Location((0, -19.491813889, 0), (0, 0, 180))):
            Circle(SKETCH_17_R)
    cut_extrude_4_tool5 = extrude(cut_extrude_4_sk5.sketch, amount=-CUT_EXTRUDE_4_REACH, mode=Mode.PRIVATE) & part.part
    # 草图17 → 切除-拉伸4 (cut, up to next)
    with BuildSketch(Plane.XY, mode=Mode.PRIVATE) as cut_extrude_4_sk6:
        with Locations(Location((-14.938938215, -28.116813889, 0), (0, 0, 180))):
            Circle(SKETCH_17_R)
    cut_extrude_4_tool6 = extrude(cut_extrude_4_sk6.sketch, amount=-CUT_EXTRUDE_4_REACH, mode=Mode.PRIVATE) & part.part
    add(cut_extrude_4_tool1.solids().sort_by_distance((-14.938938, -45.366814, 0))[0], mode=Mode.SUBTRACT)
    add(cut_extrude_4_tool2.solids().sort_by_distance((0, -53.991814, 0))[0], mode=Mode.SUBTRACT)
    add(cut_extrude_4_tool3.solids().sort_by_distance((14.938938, -45.366814, 0))[0], mode=Mode.SUBTRACT)
    add(cut_extrude_4_tool4.solids().sort_by_distance((14.938938, -28.116814, 0))[0], mode=Mode.SUBTRACT)
    add(cut_extrude_4_tool5.solids().sort_by_distance((0, -19.491814, 0))[0], mode=Mode.SUBTRACT)
    add(cut_extrude_4_tool6.solids().sort_by_distance((-14.938938, -28.116814, 0))[0], mode=Mode.SUBTRACT)

    # 草图17 → 切除-拉伸4 direction 2 (cut, up to next)
    with BuildSketch(Plane.XY, mode=Mode.PRIVATE) as cut_extrude_4_direction_2_sk1:
        with Locations(Location((-14.938938215, -45.366813889, 0), (0, 0, 180))):
            Circle(SKETCH_17_R)
    cut_extrude_4_direction_2_tool1 = extrude(cut_extrude_4_direction_2_sk1.sketch, amount=CUT_EXTRUDE_4_DIRECTION_2_REACH, mode=Mode.PRIVATE) & part.part
    # 草图17 → 切除-拉伸4 direction 2 (cut, up to next)
    with BuildSketch(Plane.XY, mode=Mode.PRIVATE) as cut_extrude_4_direction_2_sk2:
        with Locations(Location((0, -53.991813889, 0), (0, 0, 180))):
            Circle(SKETCH_17_R)
    cut_extrude_4_direction_2_tool2 = extrude(cut_extrude_4_direction_2_sk2.sketch, amount=CUT_EXTRUDE_4_DIRECTION_2_REACH, mode=Mode.PRIVATE) & part.part
    # 草图17 → 切除-拉伸4 direction 2 (cut, up to next)
    with BuildSketch(Plane.XY, mode=Mode.PRIVATE) as cut_extrude_4_direction_2_sk3:
        with Locations(Location((14.938938215, -45.366813889, 0), (0, 0, 180))):
            Circle(SKETCH_17_R)
    cut_extrude_4_direction_2_tool3 = extrude(cut_extrude_4_direction_2_sk3.sketch, amount=CUT_EXTRUDE_4_DIRECTION_2_REACH, mode=Mode.PRIVATE) & part.part
    # 草图17 → 切除-拉伸4 direction 2 (cut, up to next)
    with BuildSketch(Plane.XY, mode=Mode.PRIVATE) as cut_extrude_4_direction_2_sk4:
        with Locations(Location((14.938938215, -28.116813889, 0), (0, 0, 180))):
            Circle(SKETCH_17_R)
    cut_extrude_4_direction_2_tool4 = extrude(cut_extrude_4_direction_2_sk4.sketch, amount=CUT_EXTRUDE_4_DIRECTION_2_REACH, mode=Mode.PRIVATE) & part.part
    # 草图17 → 切除-拉伸4 direction 2 (cut, up to next)
    with BuildSketch(Plane.XY, mode=Mode.PRIVATE) as cut_extrude_4_direction_2_sk5:
        with Locations(Location((0, -19.491813889, 0), (0, 0, 180))):
            Circle(SKETCH_17_R)
    cut_extrude_4_direction_2_tool5 = extrude(cut_extrude_4_direction_2_sk5.sketch, amount=CUT_EXTRUDE_4_DIRECTION_2_REACH, mode=Mode.PRIVATE) & part.part
    # 草图17 → 切除-拉伸4 direction 2 (cut, up to next)
    with BuildSketch(Plane.XY, mode=Mode.PRIVATE) as cut_extrude_4_direction_2_sk6:
        with Locations(Location((-14.938938215, -28.116813889, 0), (0, 0, 180))):
            Circle(SKETCH_17_R)
    cut_extrude_4_direction_2_tool6 = extrude(cut_extrude_4_direction_2_sk6.sketch, amount=CUT_EXTRUDE_4_DIRECTION_2_REACH, mode=Mode.PRIVATE) & part.part
    add(cut_extrude_4_direction_2_tool1.solids().sort_by_distance((-14.938938, -45.366814, 0))[0], mode=Mode.SUBTRACT)
    add(cut_extrude_4_direction_2_tool2.solids().sort_by_distance((0, -53.991814, 0))[0], mode=Mode.SUBTRACT)
    add(cut_extrude_4_direction_2_tool3.solids().sort_by_distance((14.938938, -45.366814, 0))[0], mode=Mode.SUBTRACT)
    add(cut_extrude_4_direction_2_tool4.solids().sort_by_distance((14.938938, -28.116814, 0))[0], mode=Mode.SUBTRACT)
    add(cut_extrude_4_direction_2_tool5.solids().sort_by_distance((0, -19.491814, 0))[0], mode=Mode.SUBTRACT)
    add(cut_extrude_4_direction_2_tool6.solids().sort_by_distance((-14.938938, -28.116814, 0))[0], mode=Mode.SUBTRACT)

    # 草图18 → 切除-拉伸5 (cut)
    with BuildSketch(Plane.XY):
        with Locations((0, -36.741813889)):
            Circle(SKETCH_18_R)
    extrude(amount=-CUT_EXTRUDE_5_DEPTH, mode=Mode.SUBTRACT)

    # 草图19 → 切除-拉伸6 (cut, through all)
    with BuildSketch(Plane.ZY.offset(56.222891306)):
        Polygon((106, 6.493769151), (106, 18.741813889), (106, 31.493769151), (0, 31.493769151), (0, 18.741813889), (0, 6.493769151), align=None)
    extrude(amount=-CUT_EXTRUDE_6_DEPTH, mode=Mode.SUBTRACT)

    # 草图20 → 凸台-拉伸14 (add)
    with BuildSketch(Plane(origin=(0, 36.741813889, 0), x_dir=(1, 0, 0), z_dir=(0, 1, 0)).offset(EXTRUDE_START_4)):
        with Locations((0, -53)):
            Rectangle(SKETCH_20_W, SKETCH_20_H)
        with Locations(Location((0, -53, 0), (0, 0, 270))):
            Circle(SKETCH_20_R, mode=Mode.SUBTRACT)
    extrude(amount=-EXTRUDE_14_DEPTH)

    # 草图21 → 切除-拉伸7 (cut)
    with BuildSketch(Plane.XZ.offset(-31.493769151)):
        with Locations((0, 53)):
            Circle(SKETCH_21_R)
    extrude(amount=-CUT_EXTRUDE_7_DEPTH, mode=Mode.SUBTRACT)

    # 草图22 → 切除-拉伸8 (cut, through all)
    with BuildSketch(Plane.XZ.offset(-46.493769151)):
        with Locations(Location((0, 110, 0), (0, 0, 270))):
            Circle(SKETCH_22_R)
        with Locations(Location((49.363448016, 81.5, 0), (0, 0, 270))):
            Circle(SKETCH_22_R)
        with Locations(Location((49.363448016, 24.5, 0), (0, 0, 270))):
            Circle(SKETCH_22_R)
        with Locations(Location((0, -4, 0), (0, 0, 270))):
            Circle(SKETCH_22_R)
        with Locations(Location((-49.363448016, 24.5, 0), (0, 0, 270))):
            Circle(SKETCH_22_R)
        with Locations(Location((-49.363448016, 81.5, 0), (0, 0, 270))):
            Circle(SKETCH_22_R)
    extrude(amount=-CUT_EXTRUDE_8_DEPTH, mode=Mode.SUBTRACT)


solid = part.part
